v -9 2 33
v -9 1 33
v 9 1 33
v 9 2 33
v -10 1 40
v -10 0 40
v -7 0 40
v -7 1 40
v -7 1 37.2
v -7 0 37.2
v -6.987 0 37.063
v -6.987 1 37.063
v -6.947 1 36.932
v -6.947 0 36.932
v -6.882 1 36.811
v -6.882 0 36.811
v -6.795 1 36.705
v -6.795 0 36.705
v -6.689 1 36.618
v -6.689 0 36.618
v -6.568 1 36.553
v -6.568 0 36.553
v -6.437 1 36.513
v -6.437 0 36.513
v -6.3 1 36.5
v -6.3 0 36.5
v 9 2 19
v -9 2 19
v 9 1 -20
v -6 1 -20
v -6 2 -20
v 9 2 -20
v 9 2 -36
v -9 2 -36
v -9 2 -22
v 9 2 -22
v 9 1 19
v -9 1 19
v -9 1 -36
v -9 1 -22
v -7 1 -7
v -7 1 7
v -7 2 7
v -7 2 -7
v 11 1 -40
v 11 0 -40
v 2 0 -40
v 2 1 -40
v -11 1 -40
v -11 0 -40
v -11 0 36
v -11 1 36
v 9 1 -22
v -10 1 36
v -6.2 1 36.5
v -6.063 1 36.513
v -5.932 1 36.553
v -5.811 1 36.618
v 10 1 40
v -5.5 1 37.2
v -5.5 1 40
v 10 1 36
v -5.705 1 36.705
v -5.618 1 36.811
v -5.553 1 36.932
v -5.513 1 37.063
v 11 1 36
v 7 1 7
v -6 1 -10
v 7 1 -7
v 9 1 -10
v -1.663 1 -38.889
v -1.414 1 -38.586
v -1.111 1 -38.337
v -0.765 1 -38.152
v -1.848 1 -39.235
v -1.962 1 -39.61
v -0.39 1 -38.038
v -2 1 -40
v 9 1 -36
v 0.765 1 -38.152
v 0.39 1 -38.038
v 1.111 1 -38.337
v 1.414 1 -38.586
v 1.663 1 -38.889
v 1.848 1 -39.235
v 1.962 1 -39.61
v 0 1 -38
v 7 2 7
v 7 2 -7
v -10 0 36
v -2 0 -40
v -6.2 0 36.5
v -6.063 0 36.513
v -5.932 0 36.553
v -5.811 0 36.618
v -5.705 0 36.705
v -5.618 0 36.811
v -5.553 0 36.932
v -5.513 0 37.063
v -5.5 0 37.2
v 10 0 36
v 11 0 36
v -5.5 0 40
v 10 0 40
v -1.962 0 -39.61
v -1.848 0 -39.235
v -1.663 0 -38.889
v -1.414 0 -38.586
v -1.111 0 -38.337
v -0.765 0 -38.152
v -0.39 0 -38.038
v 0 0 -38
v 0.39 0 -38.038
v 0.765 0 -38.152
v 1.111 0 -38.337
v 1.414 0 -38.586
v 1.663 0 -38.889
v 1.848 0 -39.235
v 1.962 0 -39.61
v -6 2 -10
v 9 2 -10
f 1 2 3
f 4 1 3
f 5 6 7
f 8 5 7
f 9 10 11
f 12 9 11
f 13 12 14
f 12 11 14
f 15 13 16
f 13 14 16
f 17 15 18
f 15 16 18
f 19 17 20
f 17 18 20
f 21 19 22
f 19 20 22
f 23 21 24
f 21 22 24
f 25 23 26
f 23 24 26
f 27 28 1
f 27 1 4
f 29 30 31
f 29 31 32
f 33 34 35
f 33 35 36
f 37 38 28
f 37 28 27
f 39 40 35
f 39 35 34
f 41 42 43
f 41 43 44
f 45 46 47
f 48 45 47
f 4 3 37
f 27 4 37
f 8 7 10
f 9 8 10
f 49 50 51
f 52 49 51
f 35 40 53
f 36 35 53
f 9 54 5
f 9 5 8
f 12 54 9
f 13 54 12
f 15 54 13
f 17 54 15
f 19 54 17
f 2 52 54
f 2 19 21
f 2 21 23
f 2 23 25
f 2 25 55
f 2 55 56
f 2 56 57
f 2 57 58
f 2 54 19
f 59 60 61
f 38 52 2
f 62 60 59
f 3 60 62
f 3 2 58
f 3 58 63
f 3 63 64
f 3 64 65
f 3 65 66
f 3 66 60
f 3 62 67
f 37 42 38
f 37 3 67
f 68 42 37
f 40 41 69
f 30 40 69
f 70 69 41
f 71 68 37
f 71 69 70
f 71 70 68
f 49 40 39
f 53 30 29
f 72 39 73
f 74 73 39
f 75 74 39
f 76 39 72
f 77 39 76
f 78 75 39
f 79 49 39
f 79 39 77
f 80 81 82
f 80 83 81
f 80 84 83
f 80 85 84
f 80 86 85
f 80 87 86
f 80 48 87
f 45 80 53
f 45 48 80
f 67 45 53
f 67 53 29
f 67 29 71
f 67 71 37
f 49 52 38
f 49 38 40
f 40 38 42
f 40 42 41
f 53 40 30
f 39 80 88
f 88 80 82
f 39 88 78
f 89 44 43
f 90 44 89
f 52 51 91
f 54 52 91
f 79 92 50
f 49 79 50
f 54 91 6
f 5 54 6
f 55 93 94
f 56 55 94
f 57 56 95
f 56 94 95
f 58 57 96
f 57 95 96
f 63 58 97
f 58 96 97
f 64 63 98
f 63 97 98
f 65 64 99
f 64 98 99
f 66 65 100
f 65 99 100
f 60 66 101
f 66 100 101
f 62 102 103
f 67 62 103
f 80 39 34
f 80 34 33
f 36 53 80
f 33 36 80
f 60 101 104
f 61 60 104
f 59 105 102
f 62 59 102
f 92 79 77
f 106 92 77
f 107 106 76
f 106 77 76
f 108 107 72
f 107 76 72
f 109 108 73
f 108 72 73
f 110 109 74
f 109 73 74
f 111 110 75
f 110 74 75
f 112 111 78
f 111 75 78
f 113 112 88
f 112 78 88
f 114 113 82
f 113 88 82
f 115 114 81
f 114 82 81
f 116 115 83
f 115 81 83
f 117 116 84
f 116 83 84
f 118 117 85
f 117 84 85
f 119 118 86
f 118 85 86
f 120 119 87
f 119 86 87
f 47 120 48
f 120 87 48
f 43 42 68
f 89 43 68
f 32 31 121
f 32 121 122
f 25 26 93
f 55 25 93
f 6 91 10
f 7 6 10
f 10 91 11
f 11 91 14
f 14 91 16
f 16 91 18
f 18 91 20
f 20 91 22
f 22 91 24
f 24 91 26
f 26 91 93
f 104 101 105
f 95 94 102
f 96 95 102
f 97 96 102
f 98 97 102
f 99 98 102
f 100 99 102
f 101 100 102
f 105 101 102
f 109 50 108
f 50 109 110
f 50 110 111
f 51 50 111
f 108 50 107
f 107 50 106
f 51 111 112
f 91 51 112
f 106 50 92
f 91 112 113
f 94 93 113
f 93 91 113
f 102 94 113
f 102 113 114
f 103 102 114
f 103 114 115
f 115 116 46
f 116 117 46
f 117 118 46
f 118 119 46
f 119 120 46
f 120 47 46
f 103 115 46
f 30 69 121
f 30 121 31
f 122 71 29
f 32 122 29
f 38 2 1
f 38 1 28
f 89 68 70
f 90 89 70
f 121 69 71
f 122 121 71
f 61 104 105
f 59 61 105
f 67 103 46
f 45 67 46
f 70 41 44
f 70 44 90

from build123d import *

# Parameters (mm, degrees)
BOSS_EXTRUDE1_DEPTH = 1
SKETCH2_R           = 2
CUT_EXTRUDE1_DEPTH  = 2
SKETCH4_W           = 18
SKETCH4_H           = 14
SKETCH4_W_2         = 15
SKETCH4_H_2         = 10
SKETCH4_W_3         = 14
BOSS_EXTRUDE2_DEPTH = 1


with BuildPart() as part:
    # Sketch1 → Boss-Extrude1 (new body)
    with BuildSketch(Plane(origin=(0, 0, 0), x_dir=(1, 0, 0), z_dir=(0, 1, 0))):
        with BuildLine():
            Line((11, 40), (-11, 40))
            Line((-11, 40), (-11, -36))
            Line((-11, -36), (-10, -36))
            Line((-10, -36), (-10, -40))
            Line((-10, -40), (-7, -40))
            Line((-7, -40), (-7, -37.2))
            ThreePointArc((-7, -37.2), (-6.794974747, -36.705025253), (-6.3, -36.5))
            Line((-6.3, -36.5), (-6.2, -36.5))
            ThreePointArc((-6.2, -36.5), (-5.705025253, -36.705025253), (-5.5, -37.2))
            Line((-5.5, -37.2), (-5.5, -40))
            Line((-5.5, -40), (10, -40))
            Line((10, -40), (10, -36))
            Line((10, -36), (11, -36))
            Line((11, -36), (11, 40))
        make_face()
    extrude(amount=BOSS_EXTRUDE1_DEPTH)

    # Sketch2 → Cut-Extrude1 (cut, through all)
    with BuildSketch(Plane(origin=(0, 1, 0), x_dir=(1, 0, 0), z_dir=(0, 1, 0))):
        with Locations((0, 40)):
            Circle(SKETCH2_R)
    extrude(amount=-CUT_EXTRUDE1_DEPTH, mode=Mode.SUBTRACT)

    # Sketch4 → Boss-Extrude2 (add)
    with BuildSketch(Plane(origin=(0, 1, 0), x_dir=(1, 0, 0), z_dir=(0, 1, 0))):
        with Locations((0, 29)):
            Rectangle(SKETCH4_W, SKETCH4_H)
        with Locations((1.5, 15)):
            Rectangle(SKETCH4_W_2, SKETCH4_H_2)
        Rectangle(SKETCH4_W_3, SKETCH4_H)
        with Locations((0, -26)):
            Rectangle(SKETCH4_W, SKETCH4_H)
    extrude(amount=BOSS_EXTRUDE2_DEPTH)


solid = part.part
